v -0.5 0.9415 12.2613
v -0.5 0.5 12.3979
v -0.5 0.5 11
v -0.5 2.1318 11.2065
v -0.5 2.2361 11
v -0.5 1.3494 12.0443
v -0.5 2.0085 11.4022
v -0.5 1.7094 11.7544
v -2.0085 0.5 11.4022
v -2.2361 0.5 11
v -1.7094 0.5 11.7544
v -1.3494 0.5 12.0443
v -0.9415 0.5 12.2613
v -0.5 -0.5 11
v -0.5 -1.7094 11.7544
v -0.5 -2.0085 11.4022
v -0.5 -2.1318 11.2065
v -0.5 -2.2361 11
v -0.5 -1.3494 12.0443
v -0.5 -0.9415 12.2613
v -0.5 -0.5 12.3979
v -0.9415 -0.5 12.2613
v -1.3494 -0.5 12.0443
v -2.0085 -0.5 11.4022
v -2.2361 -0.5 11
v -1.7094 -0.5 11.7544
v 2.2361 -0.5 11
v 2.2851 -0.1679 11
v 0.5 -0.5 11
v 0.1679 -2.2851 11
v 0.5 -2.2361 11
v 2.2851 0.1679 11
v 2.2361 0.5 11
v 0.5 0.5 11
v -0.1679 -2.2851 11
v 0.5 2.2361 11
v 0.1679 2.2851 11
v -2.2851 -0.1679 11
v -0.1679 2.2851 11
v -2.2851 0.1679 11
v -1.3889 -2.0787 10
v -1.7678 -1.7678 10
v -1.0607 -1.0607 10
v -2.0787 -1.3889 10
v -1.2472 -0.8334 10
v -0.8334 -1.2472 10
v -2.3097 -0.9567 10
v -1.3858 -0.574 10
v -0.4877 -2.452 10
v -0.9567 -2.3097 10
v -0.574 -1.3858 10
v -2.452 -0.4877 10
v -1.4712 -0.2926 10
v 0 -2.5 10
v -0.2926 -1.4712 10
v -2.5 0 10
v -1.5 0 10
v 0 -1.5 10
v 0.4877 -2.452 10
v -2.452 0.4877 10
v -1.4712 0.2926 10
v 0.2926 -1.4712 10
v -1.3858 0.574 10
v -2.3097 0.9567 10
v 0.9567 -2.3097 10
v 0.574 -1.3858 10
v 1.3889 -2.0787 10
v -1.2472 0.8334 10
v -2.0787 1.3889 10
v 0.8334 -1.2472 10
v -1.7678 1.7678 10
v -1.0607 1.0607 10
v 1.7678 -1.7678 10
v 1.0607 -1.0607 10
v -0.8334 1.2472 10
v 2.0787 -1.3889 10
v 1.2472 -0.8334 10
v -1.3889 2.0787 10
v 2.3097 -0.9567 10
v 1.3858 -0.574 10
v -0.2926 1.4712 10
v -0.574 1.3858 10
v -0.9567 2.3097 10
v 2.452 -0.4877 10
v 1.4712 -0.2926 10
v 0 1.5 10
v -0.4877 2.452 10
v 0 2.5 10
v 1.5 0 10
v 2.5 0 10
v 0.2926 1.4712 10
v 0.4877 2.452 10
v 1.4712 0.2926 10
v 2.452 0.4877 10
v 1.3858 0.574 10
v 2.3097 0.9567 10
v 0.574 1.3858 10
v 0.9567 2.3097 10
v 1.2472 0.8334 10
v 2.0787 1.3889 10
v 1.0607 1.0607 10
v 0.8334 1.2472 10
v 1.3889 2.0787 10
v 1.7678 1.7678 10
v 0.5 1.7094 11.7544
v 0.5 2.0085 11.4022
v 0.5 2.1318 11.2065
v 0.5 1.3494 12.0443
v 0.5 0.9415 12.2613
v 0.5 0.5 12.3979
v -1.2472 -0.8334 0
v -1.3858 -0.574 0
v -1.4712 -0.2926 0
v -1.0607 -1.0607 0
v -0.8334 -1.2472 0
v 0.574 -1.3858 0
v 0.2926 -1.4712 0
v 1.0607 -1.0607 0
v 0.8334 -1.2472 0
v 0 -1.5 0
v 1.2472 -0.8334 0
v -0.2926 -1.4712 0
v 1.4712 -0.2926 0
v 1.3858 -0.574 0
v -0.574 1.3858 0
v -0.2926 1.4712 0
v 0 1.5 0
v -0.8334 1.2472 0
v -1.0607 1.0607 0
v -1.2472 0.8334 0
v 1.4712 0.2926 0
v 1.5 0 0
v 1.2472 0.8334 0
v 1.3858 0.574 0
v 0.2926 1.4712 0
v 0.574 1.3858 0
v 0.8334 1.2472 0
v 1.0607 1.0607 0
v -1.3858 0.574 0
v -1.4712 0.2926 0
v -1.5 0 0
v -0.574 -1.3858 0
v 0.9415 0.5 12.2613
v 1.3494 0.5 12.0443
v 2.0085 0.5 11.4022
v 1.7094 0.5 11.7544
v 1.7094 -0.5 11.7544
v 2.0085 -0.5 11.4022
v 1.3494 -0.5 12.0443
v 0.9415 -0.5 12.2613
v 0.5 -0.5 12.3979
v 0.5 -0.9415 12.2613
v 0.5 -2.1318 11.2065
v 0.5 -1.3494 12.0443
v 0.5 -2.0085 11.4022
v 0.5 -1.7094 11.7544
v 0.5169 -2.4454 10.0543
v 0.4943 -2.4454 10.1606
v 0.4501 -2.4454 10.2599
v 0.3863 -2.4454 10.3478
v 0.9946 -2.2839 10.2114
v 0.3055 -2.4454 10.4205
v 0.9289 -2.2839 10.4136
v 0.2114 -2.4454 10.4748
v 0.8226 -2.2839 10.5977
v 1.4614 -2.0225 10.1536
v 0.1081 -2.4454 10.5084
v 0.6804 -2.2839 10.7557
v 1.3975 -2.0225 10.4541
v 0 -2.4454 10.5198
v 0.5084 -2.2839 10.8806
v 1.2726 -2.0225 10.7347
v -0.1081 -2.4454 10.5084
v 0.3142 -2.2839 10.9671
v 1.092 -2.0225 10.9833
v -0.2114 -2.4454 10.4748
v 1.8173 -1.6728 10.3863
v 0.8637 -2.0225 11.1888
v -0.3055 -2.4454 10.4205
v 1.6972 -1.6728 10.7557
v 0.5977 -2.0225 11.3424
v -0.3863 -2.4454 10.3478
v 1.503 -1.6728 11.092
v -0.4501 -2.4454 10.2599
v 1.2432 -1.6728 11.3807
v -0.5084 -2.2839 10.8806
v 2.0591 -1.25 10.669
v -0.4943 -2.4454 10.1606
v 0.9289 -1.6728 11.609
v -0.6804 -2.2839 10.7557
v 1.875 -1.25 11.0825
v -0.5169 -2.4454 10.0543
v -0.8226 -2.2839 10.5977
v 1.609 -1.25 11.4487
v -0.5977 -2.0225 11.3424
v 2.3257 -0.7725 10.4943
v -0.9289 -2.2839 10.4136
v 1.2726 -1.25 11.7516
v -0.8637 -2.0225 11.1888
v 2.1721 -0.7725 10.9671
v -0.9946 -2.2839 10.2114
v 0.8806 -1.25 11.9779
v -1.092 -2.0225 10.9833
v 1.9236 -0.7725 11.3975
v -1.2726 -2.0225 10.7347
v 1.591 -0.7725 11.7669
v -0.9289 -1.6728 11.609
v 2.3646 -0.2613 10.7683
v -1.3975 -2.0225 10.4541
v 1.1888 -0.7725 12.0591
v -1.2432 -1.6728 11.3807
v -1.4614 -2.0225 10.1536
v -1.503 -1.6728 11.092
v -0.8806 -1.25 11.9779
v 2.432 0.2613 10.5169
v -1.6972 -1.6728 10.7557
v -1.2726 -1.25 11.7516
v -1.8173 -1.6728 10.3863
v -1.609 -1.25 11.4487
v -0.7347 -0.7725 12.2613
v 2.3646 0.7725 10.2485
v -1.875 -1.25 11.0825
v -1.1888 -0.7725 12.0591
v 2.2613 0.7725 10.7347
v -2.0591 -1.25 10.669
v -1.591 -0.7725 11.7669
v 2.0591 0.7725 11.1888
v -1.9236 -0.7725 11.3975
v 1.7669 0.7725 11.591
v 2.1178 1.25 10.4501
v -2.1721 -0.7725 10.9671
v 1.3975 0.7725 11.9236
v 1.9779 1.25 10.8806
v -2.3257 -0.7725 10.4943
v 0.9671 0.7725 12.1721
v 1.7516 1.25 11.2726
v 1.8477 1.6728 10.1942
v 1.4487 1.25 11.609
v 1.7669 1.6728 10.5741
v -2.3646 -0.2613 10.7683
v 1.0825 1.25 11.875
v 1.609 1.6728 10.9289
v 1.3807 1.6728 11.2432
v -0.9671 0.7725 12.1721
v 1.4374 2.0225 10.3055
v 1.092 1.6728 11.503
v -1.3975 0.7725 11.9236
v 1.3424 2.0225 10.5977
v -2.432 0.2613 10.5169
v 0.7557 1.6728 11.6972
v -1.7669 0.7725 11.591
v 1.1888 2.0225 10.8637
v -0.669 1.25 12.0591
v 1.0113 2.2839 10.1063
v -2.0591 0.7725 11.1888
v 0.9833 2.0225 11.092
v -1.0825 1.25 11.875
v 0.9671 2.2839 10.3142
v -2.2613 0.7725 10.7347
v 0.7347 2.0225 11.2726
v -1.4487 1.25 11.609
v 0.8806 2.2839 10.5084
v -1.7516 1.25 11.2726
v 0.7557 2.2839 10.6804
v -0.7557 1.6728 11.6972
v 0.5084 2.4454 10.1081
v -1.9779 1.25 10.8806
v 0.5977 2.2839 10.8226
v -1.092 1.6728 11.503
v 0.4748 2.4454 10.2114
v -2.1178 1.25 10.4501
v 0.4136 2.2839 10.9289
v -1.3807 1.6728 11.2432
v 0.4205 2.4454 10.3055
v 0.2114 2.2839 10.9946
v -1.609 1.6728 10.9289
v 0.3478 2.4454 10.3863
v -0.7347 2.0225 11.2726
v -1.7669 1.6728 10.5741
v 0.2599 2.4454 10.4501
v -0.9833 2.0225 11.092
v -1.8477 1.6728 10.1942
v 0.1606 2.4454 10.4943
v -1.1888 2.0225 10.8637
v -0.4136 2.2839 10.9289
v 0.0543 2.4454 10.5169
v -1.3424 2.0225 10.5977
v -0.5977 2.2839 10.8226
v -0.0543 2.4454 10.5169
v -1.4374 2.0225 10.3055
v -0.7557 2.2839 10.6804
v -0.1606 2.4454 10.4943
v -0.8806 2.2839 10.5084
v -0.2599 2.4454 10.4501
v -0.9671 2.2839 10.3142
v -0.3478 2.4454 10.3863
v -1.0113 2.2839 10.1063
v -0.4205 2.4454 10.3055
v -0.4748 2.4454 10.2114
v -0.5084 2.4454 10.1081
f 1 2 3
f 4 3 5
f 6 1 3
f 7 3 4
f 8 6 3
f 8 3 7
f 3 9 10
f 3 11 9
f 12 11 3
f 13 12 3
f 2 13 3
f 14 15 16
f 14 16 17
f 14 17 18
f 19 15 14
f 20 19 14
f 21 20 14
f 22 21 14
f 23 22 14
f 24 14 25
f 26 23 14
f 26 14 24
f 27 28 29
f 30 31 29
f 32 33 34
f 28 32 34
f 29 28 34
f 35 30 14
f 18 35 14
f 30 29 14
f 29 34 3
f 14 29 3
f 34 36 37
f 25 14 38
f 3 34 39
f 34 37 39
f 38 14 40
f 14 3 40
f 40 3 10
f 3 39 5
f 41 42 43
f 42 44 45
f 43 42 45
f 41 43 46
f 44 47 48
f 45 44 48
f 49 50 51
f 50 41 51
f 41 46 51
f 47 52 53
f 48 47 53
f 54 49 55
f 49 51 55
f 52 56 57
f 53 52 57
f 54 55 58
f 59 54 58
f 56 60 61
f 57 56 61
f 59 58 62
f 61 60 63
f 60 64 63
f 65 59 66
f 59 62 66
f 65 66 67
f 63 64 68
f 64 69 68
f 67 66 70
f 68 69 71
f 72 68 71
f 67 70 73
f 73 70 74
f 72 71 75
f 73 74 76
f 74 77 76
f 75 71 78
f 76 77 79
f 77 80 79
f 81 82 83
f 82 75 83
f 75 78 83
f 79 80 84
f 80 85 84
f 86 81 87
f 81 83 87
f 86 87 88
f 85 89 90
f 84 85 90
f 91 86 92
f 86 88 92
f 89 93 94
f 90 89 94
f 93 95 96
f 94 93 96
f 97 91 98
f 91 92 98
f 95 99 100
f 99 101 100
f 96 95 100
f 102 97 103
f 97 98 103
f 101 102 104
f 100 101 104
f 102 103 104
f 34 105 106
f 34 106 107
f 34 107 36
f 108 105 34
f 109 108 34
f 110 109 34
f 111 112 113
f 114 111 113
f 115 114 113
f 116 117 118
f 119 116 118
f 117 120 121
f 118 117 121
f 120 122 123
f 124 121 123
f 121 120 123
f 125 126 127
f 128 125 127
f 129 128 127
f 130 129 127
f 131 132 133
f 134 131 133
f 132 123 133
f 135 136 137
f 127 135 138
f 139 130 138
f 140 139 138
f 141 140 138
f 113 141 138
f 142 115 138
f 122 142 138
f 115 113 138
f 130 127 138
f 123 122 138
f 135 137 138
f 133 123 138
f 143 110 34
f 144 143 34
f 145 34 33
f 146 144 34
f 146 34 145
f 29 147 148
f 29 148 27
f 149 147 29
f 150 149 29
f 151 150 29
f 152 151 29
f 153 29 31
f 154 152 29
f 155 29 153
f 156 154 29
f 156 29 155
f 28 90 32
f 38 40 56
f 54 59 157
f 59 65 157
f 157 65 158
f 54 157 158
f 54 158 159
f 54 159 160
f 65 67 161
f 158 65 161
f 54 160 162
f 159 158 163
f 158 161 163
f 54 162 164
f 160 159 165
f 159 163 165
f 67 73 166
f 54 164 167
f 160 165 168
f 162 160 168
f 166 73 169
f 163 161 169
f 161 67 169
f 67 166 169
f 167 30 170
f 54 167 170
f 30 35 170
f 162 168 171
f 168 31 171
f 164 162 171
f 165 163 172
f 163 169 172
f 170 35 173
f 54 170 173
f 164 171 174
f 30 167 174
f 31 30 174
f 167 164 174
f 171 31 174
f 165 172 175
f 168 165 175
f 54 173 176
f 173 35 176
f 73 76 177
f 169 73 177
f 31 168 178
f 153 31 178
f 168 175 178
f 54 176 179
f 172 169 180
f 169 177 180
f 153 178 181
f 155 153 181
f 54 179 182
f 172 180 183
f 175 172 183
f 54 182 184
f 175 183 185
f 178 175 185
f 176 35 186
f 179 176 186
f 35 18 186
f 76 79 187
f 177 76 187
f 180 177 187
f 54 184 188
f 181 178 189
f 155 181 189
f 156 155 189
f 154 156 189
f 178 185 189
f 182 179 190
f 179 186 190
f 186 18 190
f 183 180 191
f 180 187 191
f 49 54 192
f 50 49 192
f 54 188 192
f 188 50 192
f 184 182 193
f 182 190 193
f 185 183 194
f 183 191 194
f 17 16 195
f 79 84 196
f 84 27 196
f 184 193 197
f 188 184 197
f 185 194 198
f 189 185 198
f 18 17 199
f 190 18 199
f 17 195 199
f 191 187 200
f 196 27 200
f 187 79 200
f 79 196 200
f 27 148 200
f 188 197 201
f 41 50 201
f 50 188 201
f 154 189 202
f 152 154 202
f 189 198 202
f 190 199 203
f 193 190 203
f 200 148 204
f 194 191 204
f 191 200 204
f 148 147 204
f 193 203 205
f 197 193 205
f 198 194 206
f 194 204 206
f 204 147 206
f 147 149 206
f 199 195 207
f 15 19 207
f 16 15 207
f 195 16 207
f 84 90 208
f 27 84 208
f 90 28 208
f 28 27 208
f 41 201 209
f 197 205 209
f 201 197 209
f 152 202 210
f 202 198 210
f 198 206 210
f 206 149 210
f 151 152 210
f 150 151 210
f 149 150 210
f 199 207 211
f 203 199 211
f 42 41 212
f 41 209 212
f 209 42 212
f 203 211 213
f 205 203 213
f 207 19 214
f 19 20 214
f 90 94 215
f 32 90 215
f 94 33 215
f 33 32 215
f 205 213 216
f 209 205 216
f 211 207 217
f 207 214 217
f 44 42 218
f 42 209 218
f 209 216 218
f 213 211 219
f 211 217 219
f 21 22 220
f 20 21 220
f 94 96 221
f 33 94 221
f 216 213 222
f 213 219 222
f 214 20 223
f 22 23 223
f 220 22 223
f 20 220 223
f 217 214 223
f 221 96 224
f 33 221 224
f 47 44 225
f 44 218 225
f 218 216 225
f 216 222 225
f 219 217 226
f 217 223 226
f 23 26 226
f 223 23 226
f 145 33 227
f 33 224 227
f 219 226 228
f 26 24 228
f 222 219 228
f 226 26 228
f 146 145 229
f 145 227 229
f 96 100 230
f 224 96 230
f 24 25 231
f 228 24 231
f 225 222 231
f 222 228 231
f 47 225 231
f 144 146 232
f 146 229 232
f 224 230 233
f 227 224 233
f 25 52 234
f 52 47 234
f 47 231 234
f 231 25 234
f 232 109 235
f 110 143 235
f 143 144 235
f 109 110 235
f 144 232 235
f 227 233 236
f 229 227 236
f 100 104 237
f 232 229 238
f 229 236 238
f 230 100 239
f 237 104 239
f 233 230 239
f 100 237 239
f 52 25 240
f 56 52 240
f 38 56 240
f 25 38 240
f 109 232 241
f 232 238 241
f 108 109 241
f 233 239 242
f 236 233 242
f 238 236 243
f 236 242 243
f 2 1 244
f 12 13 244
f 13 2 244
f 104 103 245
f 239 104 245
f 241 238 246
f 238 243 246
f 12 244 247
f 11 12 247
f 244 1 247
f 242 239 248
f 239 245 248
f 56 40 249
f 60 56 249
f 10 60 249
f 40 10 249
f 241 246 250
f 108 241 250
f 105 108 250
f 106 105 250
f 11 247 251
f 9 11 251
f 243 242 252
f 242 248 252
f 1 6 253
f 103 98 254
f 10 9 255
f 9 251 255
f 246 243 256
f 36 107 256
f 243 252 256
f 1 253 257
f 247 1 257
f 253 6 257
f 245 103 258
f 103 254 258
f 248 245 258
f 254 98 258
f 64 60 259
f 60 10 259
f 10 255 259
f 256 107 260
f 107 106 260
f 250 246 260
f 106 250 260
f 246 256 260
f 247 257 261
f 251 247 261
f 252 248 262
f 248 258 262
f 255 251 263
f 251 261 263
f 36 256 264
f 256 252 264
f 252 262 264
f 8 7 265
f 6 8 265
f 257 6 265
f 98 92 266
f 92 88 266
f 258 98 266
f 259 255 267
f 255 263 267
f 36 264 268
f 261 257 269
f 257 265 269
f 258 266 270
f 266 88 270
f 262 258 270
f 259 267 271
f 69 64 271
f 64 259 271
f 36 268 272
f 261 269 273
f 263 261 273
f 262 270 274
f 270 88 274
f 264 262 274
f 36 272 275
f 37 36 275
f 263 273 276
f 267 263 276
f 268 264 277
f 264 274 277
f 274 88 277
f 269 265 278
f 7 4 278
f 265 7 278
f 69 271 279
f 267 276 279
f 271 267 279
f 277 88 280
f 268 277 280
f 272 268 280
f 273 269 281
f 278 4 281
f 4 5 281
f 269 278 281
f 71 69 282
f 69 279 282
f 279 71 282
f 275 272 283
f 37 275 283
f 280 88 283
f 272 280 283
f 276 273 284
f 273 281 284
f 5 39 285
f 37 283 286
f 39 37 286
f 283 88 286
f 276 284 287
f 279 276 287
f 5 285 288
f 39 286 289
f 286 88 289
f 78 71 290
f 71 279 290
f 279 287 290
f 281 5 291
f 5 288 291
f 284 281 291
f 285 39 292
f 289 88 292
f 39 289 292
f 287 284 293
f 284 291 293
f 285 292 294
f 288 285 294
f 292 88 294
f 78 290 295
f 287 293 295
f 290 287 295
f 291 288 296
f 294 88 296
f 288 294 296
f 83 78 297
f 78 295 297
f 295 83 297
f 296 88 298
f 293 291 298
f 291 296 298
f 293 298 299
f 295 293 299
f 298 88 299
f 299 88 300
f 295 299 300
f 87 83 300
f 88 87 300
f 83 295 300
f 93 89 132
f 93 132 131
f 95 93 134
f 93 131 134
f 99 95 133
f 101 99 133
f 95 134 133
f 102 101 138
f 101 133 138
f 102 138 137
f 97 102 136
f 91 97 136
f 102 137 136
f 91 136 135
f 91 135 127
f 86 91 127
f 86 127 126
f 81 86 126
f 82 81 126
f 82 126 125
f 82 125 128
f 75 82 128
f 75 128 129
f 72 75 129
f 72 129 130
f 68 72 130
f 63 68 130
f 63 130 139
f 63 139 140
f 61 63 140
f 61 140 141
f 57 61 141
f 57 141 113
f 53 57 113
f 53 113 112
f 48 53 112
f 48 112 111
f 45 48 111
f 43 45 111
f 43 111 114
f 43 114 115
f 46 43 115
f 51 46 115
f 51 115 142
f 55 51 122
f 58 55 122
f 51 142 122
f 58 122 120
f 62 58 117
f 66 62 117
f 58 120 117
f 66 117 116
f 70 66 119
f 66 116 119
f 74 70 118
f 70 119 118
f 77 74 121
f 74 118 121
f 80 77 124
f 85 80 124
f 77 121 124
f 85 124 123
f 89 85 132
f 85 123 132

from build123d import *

# Parameters (mm, degrees)
SKETCH1_R           = 1.5
BOSS_EXTRUDE1_DEPTH = 10
REVOLVE1_ANGLE      = 180
CUT_EXTRUDE1_DEPTH  = 2


with BuildPart() as part:
    # Sketch1 → Boss-Extrude1 (new body)
    with BuildSketch(Plane.XY):
        Circle(SKETCH1_R)
    extrude(amount=BOSS_EXTRUDE1_DEPTH)

    # Sketch2 → Revolve1 (revolve)
    with BuildSketch(Plane.XY.offset(10)):
        with BuildLine():
            Line((0, 2.5), (0, -2.5))
            ThreePointArc((0, -2.5), (2.5, 0), (0, 2.5))
        make_face()
    revolve(axis=Axis((0, 2.5, 10), (0, -1, 0)), revolution_arc=REVOLVE1_ANGLE)

    # Sketch3 → Cut-Extrude1 (cut)
    with BuildSketch(Plane.XY.offset(13)):
        Polygon((0.5, 0.5), (3, 0.5), (3, -0.5), (0.5, -0.5), (0.5, -3.070620821), (-0.5, -3.070620821), (-0.5, -0.5), (-3, -0.5), (-3, 0.5), (-0.5, 0.5), (-0.5, 2.929379179), (0.5, 2.929379179), align=None)
    extrude(amount=-CUT_EXTRUDE1_DEPTH, mode=Mode.SUBTRACT)


solid = part.part
